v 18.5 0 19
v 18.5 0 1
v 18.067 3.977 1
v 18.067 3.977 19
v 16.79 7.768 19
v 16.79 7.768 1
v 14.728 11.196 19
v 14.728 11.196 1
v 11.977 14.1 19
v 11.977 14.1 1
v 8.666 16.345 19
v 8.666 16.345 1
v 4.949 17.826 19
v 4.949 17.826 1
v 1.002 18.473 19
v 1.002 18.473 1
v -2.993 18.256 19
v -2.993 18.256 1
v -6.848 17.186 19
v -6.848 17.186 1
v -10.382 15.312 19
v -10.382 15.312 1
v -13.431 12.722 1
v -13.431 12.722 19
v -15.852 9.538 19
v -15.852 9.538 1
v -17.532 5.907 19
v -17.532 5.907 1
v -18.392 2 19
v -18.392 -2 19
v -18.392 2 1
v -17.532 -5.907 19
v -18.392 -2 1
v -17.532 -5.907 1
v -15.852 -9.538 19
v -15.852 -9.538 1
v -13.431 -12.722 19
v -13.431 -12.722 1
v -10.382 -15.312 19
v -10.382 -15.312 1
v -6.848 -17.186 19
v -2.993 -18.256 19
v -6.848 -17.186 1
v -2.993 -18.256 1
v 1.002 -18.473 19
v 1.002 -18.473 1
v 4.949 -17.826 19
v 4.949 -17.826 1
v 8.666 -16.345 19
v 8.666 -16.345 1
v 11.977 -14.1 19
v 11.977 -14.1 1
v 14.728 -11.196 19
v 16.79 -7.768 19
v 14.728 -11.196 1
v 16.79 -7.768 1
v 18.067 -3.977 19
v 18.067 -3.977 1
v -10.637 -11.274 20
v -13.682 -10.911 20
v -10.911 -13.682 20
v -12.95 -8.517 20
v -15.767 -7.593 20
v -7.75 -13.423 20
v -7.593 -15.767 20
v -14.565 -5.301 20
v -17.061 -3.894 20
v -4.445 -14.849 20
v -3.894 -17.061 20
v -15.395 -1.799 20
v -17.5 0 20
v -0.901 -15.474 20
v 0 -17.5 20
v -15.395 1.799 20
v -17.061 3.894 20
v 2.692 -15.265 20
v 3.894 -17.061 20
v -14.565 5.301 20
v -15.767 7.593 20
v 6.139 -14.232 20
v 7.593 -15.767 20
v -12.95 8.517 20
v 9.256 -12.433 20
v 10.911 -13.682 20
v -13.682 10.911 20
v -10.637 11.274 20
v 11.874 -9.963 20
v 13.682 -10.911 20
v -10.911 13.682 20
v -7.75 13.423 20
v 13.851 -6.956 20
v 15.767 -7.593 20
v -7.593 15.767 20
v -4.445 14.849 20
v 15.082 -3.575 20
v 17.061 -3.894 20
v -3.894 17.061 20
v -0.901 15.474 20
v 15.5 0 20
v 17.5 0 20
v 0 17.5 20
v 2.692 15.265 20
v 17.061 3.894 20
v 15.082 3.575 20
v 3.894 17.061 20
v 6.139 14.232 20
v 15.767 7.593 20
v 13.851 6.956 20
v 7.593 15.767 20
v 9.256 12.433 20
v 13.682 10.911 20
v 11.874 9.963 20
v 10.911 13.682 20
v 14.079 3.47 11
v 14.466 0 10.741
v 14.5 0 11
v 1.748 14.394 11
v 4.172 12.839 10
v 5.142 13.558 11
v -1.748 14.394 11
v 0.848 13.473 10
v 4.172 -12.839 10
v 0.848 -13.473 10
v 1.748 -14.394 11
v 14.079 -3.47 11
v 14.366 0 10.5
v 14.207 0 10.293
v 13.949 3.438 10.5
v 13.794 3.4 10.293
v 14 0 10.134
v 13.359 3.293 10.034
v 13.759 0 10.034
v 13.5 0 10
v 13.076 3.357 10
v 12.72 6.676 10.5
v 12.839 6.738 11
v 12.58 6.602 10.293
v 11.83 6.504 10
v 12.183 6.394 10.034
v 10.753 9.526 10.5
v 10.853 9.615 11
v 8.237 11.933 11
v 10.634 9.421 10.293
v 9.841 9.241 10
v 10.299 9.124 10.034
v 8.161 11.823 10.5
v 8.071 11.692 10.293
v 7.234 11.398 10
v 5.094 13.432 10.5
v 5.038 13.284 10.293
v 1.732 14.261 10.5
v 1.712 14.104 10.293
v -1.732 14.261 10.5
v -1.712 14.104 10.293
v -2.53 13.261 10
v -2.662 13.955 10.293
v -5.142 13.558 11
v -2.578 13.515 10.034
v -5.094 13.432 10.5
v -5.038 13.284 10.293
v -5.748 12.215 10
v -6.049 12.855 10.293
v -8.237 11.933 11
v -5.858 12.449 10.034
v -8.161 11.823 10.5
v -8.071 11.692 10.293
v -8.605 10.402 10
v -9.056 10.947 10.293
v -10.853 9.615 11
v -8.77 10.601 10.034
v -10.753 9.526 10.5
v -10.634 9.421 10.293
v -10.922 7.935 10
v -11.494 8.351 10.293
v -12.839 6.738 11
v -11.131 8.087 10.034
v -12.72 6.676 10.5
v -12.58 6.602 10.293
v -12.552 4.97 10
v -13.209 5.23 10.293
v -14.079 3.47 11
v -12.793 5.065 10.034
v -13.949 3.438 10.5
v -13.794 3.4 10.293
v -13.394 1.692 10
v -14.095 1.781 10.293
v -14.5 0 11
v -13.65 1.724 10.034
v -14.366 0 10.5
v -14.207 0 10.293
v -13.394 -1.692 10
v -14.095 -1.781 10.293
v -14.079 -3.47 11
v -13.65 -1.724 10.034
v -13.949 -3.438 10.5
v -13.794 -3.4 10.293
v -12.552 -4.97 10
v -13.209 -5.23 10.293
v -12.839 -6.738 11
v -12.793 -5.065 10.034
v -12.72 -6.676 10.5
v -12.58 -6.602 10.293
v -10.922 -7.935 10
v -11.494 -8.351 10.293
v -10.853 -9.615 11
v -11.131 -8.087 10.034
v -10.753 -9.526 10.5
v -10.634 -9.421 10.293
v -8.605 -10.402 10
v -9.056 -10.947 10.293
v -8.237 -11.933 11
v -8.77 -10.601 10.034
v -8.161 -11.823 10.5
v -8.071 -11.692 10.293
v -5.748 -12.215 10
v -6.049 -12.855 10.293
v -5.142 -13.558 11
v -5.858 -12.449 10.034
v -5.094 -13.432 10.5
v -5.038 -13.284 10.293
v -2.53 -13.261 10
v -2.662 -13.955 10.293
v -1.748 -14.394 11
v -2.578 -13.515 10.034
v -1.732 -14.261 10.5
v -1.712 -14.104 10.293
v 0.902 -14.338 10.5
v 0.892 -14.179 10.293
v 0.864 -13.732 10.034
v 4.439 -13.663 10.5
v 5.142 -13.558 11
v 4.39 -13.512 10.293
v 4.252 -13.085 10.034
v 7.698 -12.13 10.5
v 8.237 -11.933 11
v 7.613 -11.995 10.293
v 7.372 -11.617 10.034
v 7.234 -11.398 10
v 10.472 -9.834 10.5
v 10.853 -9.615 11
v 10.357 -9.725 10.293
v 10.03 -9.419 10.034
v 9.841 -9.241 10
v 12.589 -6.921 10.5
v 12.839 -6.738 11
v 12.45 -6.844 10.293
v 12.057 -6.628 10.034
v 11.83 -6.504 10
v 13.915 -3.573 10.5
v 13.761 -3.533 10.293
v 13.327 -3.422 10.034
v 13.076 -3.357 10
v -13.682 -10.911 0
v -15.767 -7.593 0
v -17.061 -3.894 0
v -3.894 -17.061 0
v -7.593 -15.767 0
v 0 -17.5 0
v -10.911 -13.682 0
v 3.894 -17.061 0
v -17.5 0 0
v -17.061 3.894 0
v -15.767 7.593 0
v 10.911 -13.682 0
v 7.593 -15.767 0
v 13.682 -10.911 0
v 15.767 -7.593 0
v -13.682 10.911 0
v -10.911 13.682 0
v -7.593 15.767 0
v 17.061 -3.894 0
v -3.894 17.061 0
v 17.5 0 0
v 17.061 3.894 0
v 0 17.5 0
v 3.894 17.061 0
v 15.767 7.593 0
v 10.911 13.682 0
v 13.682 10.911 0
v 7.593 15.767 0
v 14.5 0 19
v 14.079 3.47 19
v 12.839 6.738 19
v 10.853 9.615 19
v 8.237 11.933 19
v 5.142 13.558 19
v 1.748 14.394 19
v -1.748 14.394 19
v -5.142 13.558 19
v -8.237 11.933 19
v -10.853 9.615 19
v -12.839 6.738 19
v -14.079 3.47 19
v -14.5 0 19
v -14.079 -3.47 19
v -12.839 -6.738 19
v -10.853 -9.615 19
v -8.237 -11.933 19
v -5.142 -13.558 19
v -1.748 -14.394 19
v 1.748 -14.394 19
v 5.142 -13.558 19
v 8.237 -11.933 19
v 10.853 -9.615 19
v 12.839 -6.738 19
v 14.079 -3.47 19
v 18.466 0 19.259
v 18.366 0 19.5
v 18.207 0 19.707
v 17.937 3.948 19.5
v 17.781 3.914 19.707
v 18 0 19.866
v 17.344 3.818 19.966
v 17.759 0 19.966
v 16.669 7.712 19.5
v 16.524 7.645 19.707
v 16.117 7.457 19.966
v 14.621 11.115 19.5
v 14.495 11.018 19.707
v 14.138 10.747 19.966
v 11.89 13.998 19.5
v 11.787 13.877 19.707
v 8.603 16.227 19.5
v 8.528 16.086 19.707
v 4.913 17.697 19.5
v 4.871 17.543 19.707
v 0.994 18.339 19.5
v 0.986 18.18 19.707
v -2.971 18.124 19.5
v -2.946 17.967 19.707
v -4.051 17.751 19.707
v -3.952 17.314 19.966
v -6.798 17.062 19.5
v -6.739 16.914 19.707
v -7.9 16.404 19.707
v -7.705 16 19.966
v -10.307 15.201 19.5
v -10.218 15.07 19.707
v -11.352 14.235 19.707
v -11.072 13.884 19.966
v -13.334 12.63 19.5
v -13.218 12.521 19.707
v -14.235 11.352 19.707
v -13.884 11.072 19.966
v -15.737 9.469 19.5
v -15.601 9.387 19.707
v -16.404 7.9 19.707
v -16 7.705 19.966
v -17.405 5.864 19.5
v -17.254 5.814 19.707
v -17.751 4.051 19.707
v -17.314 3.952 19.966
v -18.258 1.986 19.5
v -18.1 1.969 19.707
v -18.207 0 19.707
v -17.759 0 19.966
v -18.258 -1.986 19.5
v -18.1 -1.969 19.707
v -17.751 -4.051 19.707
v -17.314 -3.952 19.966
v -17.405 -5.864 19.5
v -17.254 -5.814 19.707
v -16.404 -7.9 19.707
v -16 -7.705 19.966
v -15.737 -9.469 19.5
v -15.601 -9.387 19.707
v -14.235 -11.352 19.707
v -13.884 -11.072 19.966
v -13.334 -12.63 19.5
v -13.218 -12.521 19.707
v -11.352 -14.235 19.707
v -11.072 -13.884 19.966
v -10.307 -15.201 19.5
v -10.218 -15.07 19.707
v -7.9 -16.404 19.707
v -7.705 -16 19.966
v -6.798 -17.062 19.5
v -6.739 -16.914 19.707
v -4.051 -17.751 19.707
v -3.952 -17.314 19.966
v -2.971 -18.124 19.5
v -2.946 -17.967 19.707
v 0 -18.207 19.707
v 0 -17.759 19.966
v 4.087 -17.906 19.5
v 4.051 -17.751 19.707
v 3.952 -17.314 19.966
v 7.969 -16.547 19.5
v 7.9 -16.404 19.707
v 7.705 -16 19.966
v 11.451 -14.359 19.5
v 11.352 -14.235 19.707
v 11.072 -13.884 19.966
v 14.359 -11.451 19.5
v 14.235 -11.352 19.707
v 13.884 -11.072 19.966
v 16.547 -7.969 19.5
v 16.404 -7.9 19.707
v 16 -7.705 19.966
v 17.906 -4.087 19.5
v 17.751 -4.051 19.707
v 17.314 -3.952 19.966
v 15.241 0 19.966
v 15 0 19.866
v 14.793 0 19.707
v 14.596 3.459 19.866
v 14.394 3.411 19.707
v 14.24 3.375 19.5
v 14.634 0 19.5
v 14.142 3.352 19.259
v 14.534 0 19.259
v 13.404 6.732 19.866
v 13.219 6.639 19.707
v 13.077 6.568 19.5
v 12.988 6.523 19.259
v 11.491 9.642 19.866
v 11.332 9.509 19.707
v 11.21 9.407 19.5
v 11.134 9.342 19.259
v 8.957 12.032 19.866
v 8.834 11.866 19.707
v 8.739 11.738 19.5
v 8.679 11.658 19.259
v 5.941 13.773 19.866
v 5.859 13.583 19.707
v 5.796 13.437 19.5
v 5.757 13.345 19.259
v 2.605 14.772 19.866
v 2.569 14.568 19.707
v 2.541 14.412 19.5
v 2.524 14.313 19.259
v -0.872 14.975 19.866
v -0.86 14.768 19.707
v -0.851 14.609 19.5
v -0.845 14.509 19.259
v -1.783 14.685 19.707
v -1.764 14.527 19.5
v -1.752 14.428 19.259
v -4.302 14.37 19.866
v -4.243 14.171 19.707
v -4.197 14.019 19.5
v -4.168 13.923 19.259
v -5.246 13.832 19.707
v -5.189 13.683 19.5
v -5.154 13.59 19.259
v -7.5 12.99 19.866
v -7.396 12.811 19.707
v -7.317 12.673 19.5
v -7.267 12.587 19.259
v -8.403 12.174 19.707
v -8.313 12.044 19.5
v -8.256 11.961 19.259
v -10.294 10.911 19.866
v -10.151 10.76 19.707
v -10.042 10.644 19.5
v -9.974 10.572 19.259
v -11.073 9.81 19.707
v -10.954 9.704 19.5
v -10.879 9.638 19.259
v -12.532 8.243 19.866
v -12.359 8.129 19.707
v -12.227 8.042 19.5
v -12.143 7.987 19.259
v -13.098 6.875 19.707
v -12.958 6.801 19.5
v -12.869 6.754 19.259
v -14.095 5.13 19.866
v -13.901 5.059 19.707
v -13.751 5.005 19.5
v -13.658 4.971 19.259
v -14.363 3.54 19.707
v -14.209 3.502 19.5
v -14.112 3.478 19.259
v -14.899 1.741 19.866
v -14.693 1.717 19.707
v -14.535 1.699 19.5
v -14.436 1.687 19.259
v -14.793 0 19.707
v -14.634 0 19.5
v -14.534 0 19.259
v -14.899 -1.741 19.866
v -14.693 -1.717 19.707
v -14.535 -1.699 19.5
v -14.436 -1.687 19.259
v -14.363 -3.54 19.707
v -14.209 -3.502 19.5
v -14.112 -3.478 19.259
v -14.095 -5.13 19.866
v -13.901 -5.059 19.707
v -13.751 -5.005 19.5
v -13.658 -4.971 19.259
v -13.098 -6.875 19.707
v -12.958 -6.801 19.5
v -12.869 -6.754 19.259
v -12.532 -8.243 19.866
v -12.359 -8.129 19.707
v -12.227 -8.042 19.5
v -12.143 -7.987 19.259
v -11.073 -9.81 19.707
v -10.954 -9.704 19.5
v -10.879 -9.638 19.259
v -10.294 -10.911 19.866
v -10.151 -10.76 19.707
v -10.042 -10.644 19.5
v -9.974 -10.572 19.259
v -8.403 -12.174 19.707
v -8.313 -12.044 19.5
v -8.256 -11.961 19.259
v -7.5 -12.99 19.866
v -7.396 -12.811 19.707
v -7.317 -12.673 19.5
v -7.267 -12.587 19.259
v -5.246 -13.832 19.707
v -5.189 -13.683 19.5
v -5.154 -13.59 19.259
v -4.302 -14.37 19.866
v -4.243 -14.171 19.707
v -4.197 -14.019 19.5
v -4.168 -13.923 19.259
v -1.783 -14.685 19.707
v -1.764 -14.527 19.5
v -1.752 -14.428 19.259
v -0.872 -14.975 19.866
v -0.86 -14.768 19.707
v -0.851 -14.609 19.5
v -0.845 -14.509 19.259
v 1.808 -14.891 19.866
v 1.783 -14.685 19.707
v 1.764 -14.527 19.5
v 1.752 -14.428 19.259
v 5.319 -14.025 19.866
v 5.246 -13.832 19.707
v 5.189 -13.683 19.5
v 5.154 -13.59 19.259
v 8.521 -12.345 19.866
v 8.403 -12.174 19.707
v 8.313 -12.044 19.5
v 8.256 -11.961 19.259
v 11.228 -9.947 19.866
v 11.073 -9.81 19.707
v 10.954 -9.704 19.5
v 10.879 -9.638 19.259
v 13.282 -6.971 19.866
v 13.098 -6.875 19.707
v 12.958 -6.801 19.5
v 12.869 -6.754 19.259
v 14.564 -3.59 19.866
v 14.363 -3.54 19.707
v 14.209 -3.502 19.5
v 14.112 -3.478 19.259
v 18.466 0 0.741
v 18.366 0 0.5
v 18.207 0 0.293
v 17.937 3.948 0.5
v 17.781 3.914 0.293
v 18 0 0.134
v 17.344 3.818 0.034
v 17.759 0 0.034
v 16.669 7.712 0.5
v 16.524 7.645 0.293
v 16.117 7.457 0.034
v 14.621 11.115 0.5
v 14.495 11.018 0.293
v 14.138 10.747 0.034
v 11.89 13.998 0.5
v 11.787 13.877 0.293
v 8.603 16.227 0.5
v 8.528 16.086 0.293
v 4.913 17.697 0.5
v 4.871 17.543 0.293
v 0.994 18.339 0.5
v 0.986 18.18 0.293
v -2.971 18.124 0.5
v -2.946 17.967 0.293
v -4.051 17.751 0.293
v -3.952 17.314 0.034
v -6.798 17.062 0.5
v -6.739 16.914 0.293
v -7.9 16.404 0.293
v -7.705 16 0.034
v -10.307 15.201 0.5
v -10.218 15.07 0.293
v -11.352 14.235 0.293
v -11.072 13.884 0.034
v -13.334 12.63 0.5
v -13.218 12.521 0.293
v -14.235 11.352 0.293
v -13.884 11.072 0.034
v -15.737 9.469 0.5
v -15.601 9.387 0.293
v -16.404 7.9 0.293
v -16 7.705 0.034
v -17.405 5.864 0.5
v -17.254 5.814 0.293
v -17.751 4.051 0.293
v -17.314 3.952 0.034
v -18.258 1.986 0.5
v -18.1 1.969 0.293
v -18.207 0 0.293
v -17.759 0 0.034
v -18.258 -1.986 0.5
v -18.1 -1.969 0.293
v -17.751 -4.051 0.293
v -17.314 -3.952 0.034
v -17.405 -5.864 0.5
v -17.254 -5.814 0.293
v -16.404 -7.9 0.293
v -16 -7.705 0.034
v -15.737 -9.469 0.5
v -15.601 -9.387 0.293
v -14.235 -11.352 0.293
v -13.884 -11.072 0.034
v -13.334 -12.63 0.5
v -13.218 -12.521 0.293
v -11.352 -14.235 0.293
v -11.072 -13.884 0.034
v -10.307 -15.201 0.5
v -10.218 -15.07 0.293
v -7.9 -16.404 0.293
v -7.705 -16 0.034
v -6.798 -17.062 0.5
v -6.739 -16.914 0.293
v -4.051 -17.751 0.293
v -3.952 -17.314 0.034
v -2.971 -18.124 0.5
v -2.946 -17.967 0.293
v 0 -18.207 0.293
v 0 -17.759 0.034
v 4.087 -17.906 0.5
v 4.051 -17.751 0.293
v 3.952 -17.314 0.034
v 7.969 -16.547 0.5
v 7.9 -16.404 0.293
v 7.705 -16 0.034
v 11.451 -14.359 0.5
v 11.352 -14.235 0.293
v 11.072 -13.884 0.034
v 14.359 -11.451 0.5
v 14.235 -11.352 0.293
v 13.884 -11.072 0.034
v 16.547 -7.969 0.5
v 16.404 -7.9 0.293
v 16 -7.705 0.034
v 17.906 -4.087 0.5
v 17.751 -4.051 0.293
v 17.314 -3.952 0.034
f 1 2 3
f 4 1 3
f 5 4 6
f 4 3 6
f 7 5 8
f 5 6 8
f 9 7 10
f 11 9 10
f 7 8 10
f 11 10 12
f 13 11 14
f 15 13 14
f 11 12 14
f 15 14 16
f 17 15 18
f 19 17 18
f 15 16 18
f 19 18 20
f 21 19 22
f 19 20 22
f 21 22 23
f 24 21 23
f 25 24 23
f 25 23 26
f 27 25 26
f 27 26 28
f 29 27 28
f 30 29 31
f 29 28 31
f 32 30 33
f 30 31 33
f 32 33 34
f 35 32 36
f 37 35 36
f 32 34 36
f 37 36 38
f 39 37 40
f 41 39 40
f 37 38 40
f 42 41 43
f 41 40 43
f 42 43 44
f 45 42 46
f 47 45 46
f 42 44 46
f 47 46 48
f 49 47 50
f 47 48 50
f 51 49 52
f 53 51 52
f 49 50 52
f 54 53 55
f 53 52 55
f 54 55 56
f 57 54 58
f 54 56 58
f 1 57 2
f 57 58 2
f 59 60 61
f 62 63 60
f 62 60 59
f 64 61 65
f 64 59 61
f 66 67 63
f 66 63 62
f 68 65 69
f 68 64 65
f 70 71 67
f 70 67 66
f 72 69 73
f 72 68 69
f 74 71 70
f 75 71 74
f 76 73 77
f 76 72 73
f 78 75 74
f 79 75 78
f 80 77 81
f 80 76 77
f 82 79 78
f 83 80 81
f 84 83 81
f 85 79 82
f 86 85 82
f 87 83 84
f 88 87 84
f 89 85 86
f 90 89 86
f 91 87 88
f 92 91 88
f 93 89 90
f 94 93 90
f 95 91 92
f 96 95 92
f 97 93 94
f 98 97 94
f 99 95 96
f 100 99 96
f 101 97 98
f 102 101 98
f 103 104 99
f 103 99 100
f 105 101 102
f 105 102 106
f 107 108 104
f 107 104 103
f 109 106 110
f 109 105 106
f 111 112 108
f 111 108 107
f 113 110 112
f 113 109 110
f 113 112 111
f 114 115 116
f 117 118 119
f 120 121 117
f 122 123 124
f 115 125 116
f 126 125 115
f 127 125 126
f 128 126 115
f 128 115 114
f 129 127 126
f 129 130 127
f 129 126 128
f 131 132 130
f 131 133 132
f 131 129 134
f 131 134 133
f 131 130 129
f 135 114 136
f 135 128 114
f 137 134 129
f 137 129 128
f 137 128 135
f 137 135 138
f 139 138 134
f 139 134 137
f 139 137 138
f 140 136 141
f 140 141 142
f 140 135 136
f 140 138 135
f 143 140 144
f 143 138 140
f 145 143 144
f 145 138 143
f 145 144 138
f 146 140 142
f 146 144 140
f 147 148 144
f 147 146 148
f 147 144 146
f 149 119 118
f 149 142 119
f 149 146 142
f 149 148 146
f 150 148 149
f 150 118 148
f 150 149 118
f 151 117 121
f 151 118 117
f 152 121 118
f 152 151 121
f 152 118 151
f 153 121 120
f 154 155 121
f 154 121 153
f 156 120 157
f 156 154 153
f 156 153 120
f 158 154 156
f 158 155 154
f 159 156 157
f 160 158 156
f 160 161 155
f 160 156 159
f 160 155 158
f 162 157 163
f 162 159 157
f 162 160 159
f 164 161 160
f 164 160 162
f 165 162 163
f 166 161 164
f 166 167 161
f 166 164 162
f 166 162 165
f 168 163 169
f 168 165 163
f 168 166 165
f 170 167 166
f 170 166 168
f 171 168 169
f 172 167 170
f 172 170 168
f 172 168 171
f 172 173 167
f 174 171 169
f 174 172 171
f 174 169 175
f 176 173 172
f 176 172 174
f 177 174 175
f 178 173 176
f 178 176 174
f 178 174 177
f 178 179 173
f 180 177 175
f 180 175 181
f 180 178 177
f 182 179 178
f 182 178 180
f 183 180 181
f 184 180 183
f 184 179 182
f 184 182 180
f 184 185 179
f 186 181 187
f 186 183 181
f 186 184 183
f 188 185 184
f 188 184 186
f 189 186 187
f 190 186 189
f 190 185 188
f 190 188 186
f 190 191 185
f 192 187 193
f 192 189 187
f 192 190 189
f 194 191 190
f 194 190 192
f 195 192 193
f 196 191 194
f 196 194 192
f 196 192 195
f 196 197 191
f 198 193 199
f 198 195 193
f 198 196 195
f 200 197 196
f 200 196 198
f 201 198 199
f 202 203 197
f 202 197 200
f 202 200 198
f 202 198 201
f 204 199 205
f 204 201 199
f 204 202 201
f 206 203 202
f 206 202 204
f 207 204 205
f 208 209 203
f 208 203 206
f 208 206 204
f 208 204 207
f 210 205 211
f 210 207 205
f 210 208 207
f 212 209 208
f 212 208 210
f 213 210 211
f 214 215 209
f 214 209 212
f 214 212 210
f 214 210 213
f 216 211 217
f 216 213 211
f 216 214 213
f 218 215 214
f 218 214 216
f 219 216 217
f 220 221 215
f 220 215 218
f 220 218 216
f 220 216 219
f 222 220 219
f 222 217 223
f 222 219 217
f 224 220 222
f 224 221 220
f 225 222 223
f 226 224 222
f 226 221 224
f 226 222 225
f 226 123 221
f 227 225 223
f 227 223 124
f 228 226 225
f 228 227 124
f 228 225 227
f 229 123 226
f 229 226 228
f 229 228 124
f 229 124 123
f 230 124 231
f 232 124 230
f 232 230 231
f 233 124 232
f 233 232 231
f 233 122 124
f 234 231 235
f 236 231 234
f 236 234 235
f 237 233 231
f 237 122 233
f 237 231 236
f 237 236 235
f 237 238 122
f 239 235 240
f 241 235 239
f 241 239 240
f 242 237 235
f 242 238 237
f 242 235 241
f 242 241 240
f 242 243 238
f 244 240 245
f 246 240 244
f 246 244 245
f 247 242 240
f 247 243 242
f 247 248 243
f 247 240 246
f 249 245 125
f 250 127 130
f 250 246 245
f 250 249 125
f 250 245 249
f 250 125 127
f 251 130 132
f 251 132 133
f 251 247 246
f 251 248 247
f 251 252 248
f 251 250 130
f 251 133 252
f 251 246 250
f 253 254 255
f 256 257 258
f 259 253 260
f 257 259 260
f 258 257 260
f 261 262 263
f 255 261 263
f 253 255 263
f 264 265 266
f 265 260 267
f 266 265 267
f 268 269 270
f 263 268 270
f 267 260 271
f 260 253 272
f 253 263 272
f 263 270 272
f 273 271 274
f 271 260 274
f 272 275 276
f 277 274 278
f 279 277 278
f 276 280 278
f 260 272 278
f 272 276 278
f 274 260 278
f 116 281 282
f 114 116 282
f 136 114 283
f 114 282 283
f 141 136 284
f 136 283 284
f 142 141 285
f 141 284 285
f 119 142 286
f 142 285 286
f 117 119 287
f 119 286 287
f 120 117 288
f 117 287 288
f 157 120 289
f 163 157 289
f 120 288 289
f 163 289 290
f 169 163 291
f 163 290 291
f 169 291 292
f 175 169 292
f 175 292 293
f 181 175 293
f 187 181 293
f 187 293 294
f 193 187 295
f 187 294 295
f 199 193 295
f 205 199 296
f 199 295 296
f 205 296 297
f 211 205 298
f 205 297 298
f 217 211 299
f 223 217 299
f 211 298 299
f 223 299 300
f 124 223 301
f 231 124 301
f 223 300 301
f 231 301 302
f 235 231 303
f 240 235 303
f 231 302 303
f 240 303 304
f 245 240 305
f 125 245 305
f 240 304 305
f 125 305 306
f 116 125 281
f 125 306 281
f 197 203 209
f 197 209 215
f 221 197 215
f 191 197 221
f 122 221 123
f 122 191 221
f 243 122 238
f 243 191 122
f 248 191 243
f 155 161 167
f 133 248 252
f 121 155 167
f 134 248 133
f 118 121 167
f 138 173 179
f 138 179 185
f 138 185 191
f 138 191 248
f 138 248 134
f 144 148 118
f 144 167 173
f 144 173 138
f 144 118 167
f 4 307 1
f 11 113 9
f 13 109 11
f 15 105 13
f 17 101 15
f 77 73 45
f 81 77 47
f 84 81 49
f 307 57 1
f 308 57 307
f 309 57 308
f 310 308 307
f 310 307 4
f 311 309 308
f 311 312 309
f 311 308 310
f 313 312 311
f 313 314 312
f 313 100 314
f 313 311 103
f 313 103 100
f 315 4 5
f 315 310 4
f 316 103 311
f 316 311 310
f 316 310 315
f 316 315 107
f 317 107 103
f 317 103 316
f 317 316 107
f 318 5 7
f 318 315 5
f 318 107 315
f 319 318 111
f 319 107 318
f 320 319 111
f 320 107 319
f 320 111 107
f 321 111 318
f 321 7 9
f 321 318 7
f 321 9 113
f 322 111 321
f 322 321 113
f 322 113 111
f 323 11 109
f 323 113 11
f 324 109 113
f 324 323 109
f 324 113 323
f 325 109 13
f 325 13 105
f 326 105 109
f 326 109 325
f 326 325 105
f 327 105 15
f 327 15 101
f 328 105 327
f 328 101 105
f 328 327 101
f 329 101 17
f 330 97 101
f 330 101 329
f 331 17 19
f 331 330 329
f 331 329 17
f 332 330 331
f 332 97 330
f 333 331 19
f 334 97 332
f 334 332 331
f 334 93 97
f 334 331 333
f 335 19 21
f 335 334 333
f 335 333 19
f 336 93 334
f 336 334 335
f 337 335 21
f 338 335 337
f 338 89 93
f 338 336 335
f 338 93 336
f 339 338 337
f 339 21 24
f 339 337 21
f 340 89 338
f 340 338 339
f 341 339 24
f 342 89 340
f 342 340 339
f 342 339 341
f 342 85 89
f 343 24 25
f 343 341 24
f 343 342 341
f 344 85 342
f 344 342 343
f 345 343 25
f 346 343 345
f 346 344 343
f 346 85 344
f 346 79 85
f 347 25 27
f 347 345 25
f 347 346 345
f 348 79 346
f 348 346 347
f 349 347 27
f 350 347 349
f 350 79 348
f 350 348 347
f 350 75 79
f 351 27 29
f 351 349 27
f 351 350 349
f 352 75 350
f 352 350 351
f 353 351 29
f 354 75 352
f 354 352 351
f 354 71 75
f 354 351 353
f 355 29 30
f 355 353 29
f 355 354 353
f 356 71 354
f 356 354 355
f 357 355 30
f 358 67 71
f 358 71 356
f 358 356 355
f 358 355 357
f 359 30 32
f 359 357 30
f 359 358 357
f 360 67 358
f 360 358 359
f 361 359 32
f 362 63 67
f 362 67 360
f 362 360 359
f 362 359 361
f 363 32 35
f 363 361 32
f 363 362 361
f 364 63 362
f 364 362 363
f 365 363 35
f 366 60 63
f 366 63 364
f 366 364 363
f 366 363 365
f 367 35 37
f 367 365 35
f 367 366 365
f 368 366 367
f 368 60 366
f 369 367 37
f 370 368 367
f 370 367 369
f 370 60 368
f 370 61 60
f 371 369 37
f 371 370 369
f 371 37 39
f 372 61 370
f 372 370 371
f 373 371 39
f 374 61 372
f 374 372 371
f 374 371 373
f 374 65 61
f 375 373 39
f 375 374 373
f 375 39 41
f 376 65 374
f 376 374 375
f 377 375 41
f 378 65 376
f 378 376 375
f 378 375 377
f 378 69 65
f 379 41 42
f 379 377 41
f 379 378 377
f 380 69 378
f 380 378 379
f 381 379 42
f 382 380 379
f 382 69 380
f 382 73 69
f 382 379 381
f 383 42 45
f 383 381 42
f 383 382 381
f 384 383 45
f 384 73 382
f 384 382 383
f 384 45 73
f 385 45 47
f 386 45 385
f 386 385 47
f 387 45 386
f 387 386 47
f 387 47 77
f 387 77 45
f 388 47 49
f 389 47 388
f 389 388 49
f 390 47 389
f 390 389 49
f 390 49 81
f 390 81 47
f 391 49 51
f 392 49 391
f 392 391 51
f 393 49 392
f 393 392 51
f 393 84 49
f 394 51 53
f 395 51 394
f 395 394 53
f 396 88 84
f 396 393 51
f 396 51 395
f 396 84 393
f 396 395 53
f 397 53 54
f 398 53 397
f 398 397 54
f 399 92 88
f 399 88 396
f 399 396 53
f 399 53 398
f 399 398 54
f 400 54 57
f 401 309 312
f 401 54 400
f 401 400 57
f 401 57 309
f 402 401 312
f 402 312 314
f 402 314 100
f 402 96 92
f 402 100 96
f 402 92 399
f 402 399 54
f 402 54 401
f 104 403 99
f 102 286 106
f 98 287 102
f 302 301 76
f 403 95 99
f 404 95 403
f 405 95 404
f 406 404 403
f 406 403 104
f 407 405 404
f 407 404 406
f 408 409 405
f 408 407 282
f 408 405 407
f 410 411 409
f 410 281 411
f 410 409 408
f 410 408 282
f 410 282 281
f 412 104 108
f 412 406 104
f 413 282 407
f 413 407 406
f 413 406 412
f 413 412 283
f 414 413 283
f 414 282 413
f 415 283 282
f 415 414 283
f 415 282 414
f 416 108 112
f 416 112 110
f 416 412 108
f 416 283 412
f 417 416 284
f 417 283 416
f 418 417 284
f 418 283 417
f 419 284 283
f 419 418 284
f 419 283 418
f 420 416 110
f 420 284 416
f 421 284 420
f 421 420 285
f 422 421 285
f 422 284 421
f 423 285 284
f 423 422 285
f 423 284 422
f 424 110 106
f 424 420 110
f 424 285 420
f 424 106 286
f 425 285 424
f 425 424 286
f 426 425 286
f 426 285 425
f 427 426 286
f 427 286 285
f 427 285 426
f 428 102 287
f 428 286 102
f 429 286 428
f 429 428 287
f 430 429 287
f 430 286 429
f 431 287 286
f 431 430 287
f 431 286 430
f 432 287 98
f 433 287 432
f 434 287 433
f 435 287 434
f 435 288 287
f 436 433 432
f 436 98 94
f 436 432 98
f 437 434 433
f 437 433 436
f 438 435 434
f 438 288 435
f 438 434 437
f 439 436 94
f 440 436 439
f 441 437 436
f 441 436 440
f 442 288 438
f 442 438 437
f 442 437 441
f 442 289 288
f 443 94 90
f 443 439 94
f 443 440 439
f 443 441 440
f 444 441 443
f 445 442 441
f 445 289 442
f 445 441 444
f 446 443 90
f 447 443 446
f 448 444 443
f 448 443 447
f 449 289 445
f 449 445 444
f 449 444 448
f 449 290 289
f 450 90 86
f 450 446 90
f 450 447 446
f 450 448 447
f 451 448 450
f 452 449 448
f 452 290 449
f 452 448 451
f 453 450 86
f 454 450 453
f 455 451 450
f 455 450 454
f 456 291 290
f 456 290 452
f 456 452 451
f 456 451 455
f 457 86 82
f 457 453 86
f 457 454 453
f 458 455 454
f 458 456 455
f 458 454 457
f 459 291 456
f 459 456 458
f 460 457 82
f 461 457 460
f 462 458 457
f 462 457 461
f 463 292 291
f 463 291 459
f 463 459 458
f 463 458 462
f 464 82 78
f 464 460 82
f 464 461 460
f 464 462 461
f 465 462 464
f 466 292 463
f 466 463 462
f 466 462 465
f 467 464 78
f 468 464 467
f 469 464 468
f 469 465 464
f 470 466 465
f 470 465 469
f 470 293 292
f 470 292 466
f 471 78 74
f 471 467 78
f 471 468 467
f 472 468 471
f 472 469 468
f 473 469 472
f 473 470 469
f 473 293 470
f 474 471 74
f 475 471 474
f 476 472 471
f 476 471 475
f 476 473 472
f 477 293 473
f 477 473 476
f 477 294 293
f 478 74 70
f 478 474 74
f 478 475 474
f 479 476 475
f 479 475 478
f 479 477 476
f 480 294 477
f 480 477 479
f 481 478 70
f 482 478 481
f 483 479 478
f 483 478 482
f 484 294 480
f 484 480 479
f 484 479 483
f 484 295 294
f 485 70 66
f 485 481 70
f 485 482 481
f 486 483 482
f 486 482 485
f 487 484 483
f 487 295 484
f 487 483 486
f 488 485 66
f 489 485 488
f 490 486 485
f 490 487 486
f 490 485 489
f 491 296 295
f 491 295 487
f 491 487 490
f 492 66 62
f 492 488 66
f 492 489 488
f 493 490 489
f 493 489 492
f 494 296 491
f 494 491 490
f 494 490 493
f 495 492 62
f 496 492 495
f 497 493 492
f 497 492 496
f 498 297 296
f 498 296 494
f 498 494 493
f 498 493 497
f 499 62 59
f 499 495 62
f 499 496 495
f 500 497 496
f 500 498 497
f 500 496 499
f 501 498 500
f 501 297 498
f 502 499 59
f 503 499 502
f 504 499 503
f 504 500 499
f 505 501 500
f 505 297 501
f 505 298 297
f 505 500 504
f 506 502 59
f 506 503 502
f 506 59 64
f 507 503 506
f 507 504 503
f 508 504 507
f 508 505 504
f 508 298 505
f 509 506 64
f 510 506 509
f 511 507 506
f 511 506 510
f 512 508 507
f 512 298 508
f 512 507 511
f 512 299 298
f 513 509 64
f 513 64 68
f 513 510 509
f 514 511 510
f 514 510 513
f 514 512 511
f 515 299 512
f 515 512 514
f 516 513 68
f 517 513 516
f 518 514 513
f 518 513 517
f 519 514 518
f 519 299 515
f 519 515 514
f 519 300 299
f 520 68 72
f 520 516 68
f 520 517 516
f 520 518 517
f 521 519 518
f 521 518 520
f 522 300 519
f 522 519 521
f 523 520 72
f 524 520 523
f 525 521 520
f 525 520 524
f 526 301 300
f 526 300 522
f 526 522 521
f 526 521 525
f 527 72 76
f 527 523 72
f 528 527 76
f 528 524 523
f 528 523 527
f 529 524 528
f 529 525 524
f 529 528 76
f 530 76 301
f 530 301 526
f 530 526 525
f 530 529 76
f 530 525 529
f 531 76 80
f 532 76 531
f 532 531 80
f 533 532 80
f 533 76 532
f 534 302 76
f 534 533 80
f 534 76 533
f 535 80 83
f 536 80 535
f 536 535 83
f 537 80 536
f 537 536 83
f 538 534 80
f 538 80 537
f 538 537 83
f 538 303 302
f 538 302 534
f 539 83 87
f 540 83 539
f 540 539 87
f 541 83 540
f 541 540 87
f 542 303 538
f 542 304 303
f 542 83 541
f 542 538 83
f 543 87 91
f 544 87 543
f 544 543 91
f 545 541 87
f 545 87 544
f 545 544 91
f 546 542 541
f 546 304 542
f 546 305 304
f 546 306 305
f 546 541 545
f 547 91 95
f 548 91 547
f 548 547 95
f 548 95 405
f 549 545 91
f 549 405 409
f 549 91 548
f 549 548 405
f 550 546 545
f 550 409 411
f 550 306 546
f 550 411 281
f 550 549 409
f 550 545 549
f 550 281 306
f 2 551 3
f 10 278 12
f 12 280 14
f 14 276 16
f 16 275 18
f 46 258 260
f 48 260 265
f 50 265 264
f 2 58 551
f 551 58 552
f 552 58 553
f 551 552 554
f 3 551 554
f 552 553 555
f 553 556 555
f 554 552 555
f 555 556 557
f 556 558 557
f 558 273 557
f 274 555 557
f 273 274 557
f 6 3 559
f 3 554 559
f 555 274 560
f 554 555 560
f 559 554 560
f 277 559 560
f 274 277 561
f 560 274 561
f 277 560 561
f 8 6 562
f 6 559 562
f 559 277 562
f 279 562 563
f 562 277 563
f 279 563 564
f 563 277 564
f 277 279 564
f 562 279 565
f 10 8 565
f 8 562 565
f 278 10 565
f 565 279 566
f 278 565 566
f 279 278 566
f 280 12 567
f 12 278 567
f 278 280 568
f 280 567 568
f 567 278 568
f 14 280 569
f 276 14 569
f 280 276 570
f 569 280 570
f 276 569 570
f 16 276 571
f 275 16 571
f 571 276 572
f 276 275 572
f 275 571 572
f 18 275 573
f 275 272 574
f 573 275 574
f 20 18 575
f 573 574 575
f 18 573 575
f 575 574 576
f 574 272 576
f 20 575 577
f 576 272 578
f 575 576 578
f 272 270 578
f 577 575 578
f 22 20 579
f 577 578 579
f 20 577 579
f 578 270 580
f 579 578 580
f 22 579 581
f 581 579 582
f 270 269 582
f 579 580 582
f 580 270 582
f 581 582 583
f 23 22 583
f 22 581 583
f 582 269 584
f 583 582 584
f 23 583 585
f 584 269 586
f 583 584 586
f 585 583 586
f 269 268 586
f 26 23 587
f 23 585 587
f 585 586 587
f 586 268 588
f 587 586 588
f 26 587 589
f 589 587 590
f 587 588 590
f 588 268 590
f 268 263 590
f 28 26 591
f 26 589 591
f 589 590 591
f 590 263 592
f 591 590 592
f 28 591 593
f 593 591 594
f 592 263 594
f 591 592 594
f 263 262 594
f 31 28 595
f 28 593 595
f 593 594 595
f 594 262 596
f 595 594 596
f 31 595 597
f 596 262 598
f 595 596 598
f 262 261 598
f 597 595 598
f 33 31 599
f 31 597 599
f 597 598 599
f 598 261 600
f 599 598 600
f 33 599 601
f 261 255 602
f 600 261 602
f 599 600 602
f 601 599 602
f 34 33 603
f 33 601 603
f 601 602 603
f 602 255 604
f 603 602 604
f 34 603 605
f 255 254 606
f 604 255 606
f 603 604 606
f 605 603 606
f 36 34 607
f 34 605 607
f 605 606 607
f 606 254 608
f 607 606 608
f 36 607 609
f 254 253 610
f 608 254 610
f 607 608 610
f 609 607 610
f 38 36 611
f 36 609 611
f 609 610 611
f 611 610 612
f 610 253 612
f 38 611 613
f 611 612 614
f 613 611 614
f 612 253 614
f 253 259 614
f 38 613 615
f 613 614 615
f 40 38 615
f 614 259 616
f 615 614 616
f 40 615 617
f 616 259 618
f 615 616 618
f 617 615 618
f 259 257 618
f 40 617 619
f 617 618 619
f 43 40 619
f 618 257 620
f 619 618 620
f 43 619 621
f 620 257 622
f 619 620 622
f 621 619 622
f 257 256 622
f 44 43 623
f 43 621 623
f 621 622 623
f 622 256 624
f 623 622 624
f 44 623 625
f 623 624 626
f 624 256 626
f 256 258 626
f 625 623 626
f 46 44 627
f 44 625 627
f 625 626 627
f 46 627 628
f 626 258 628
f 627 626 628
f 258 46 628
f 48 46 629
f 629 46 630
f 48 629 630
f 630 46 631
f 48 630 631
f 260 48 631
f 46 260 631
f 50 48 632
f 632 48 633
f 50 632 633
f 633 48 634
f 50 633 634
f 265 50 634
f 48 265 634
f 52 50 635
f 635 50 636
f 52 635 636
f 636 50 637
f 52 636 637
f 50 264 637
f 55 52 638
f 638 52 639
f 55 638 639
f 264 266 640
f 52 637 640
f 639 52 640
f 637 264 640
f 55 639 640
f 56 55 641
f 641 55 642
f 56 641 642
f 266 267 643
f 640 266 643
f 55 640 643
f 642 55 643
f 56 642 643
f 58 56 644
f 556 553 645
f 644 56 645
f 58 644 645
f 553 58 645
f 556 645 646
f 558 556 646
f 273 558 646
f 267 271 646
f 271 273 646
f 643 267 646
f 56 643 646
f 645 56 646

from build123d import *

# Parameters (mm, degrees)
F0_R     = 18.5
F1_DEPTH = 20
F2_R     = 14.5
F3_DEPTH = 10
F4_R     = 1


with BuildPart() as f1:
    # F0 (on Top) → F1 (new body)
    with BuildSketch(Plane.XY):
        Circle(F0_R)
    extrude(amount=F1_DEPTH)

    # F2 (on face) → F3 (cut)
    with BuildSketch(Plane.XY.offset(20)):
        Circle(F2_R)
    extrude(amount=-F3_DEPTH, mode=Mode.SUBTRACT)

    # F4
    f4_edges = [f1.edges().sort_by_distance(p)[0] for p in [
        (-18.5, 0, 20),
        (-14.5, 0, 20),
        (-18.5, 0, 0),
        (-14.5, 0, 10),
    ]]
    fillet(f4_edges, radius=F4_R)


solid = f1.part
